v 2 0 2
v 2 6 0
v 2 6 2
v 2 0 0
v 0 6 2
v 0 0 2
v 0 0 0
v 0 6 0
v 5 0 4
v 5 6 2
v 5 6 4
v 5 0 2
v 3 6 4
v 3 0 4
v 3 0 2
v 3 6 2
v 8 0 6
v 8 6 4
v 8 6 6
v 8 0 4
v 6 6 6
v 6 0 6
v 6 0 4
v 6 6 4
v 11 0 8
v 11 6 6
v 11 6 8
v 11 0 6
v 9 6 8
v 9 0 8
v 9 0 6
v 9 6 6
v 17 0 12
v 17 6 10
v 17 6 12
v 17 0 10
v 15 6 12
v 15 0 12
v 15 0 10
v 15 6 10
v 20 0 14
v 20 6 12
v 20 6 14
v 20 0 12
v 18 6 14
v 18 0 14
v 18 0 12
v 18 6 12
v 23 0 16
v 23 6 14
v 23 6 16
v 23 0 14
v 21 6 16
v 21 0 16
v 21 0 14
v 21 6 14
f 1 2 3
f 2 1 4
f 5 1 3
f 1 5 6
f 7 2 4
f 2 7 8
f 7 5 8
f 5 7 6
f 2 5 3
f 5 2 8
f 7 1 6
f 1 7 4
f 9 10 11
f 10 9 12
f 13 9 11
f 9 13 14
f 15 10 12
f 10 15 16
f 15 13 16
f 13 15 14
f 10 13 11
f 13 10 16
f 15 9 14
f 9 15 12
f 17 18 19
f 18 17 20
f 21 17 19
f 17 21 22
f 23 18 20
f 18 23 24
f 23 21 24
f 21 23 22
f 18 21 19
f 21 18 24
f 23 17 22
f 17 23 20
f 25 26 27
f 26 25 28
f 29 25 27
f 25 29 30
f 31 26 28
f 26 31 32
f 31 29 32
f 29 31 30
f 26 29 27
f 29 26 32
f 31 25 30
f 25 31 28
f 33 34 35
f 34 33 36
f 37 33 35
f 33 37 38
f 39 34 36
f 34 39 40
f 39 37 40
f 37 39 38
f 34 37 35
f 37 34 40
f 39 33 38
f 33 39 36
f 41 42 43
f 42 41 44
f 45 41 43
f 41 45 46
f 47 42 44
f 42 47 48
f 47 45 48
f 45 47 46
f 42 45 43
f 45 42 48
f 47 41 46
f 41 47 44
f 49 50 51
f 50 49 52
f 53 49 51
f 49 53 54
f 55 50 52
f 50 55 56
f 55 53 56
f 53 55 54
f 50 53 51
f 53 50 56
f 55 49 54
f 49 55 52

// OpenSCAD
union() {
  for (i = [0:7]) {
    if (i != 4) {
      translate([i * 3, 0, i * 2]) cube(size=[2,6,2], center=false);
    }
  }
}
